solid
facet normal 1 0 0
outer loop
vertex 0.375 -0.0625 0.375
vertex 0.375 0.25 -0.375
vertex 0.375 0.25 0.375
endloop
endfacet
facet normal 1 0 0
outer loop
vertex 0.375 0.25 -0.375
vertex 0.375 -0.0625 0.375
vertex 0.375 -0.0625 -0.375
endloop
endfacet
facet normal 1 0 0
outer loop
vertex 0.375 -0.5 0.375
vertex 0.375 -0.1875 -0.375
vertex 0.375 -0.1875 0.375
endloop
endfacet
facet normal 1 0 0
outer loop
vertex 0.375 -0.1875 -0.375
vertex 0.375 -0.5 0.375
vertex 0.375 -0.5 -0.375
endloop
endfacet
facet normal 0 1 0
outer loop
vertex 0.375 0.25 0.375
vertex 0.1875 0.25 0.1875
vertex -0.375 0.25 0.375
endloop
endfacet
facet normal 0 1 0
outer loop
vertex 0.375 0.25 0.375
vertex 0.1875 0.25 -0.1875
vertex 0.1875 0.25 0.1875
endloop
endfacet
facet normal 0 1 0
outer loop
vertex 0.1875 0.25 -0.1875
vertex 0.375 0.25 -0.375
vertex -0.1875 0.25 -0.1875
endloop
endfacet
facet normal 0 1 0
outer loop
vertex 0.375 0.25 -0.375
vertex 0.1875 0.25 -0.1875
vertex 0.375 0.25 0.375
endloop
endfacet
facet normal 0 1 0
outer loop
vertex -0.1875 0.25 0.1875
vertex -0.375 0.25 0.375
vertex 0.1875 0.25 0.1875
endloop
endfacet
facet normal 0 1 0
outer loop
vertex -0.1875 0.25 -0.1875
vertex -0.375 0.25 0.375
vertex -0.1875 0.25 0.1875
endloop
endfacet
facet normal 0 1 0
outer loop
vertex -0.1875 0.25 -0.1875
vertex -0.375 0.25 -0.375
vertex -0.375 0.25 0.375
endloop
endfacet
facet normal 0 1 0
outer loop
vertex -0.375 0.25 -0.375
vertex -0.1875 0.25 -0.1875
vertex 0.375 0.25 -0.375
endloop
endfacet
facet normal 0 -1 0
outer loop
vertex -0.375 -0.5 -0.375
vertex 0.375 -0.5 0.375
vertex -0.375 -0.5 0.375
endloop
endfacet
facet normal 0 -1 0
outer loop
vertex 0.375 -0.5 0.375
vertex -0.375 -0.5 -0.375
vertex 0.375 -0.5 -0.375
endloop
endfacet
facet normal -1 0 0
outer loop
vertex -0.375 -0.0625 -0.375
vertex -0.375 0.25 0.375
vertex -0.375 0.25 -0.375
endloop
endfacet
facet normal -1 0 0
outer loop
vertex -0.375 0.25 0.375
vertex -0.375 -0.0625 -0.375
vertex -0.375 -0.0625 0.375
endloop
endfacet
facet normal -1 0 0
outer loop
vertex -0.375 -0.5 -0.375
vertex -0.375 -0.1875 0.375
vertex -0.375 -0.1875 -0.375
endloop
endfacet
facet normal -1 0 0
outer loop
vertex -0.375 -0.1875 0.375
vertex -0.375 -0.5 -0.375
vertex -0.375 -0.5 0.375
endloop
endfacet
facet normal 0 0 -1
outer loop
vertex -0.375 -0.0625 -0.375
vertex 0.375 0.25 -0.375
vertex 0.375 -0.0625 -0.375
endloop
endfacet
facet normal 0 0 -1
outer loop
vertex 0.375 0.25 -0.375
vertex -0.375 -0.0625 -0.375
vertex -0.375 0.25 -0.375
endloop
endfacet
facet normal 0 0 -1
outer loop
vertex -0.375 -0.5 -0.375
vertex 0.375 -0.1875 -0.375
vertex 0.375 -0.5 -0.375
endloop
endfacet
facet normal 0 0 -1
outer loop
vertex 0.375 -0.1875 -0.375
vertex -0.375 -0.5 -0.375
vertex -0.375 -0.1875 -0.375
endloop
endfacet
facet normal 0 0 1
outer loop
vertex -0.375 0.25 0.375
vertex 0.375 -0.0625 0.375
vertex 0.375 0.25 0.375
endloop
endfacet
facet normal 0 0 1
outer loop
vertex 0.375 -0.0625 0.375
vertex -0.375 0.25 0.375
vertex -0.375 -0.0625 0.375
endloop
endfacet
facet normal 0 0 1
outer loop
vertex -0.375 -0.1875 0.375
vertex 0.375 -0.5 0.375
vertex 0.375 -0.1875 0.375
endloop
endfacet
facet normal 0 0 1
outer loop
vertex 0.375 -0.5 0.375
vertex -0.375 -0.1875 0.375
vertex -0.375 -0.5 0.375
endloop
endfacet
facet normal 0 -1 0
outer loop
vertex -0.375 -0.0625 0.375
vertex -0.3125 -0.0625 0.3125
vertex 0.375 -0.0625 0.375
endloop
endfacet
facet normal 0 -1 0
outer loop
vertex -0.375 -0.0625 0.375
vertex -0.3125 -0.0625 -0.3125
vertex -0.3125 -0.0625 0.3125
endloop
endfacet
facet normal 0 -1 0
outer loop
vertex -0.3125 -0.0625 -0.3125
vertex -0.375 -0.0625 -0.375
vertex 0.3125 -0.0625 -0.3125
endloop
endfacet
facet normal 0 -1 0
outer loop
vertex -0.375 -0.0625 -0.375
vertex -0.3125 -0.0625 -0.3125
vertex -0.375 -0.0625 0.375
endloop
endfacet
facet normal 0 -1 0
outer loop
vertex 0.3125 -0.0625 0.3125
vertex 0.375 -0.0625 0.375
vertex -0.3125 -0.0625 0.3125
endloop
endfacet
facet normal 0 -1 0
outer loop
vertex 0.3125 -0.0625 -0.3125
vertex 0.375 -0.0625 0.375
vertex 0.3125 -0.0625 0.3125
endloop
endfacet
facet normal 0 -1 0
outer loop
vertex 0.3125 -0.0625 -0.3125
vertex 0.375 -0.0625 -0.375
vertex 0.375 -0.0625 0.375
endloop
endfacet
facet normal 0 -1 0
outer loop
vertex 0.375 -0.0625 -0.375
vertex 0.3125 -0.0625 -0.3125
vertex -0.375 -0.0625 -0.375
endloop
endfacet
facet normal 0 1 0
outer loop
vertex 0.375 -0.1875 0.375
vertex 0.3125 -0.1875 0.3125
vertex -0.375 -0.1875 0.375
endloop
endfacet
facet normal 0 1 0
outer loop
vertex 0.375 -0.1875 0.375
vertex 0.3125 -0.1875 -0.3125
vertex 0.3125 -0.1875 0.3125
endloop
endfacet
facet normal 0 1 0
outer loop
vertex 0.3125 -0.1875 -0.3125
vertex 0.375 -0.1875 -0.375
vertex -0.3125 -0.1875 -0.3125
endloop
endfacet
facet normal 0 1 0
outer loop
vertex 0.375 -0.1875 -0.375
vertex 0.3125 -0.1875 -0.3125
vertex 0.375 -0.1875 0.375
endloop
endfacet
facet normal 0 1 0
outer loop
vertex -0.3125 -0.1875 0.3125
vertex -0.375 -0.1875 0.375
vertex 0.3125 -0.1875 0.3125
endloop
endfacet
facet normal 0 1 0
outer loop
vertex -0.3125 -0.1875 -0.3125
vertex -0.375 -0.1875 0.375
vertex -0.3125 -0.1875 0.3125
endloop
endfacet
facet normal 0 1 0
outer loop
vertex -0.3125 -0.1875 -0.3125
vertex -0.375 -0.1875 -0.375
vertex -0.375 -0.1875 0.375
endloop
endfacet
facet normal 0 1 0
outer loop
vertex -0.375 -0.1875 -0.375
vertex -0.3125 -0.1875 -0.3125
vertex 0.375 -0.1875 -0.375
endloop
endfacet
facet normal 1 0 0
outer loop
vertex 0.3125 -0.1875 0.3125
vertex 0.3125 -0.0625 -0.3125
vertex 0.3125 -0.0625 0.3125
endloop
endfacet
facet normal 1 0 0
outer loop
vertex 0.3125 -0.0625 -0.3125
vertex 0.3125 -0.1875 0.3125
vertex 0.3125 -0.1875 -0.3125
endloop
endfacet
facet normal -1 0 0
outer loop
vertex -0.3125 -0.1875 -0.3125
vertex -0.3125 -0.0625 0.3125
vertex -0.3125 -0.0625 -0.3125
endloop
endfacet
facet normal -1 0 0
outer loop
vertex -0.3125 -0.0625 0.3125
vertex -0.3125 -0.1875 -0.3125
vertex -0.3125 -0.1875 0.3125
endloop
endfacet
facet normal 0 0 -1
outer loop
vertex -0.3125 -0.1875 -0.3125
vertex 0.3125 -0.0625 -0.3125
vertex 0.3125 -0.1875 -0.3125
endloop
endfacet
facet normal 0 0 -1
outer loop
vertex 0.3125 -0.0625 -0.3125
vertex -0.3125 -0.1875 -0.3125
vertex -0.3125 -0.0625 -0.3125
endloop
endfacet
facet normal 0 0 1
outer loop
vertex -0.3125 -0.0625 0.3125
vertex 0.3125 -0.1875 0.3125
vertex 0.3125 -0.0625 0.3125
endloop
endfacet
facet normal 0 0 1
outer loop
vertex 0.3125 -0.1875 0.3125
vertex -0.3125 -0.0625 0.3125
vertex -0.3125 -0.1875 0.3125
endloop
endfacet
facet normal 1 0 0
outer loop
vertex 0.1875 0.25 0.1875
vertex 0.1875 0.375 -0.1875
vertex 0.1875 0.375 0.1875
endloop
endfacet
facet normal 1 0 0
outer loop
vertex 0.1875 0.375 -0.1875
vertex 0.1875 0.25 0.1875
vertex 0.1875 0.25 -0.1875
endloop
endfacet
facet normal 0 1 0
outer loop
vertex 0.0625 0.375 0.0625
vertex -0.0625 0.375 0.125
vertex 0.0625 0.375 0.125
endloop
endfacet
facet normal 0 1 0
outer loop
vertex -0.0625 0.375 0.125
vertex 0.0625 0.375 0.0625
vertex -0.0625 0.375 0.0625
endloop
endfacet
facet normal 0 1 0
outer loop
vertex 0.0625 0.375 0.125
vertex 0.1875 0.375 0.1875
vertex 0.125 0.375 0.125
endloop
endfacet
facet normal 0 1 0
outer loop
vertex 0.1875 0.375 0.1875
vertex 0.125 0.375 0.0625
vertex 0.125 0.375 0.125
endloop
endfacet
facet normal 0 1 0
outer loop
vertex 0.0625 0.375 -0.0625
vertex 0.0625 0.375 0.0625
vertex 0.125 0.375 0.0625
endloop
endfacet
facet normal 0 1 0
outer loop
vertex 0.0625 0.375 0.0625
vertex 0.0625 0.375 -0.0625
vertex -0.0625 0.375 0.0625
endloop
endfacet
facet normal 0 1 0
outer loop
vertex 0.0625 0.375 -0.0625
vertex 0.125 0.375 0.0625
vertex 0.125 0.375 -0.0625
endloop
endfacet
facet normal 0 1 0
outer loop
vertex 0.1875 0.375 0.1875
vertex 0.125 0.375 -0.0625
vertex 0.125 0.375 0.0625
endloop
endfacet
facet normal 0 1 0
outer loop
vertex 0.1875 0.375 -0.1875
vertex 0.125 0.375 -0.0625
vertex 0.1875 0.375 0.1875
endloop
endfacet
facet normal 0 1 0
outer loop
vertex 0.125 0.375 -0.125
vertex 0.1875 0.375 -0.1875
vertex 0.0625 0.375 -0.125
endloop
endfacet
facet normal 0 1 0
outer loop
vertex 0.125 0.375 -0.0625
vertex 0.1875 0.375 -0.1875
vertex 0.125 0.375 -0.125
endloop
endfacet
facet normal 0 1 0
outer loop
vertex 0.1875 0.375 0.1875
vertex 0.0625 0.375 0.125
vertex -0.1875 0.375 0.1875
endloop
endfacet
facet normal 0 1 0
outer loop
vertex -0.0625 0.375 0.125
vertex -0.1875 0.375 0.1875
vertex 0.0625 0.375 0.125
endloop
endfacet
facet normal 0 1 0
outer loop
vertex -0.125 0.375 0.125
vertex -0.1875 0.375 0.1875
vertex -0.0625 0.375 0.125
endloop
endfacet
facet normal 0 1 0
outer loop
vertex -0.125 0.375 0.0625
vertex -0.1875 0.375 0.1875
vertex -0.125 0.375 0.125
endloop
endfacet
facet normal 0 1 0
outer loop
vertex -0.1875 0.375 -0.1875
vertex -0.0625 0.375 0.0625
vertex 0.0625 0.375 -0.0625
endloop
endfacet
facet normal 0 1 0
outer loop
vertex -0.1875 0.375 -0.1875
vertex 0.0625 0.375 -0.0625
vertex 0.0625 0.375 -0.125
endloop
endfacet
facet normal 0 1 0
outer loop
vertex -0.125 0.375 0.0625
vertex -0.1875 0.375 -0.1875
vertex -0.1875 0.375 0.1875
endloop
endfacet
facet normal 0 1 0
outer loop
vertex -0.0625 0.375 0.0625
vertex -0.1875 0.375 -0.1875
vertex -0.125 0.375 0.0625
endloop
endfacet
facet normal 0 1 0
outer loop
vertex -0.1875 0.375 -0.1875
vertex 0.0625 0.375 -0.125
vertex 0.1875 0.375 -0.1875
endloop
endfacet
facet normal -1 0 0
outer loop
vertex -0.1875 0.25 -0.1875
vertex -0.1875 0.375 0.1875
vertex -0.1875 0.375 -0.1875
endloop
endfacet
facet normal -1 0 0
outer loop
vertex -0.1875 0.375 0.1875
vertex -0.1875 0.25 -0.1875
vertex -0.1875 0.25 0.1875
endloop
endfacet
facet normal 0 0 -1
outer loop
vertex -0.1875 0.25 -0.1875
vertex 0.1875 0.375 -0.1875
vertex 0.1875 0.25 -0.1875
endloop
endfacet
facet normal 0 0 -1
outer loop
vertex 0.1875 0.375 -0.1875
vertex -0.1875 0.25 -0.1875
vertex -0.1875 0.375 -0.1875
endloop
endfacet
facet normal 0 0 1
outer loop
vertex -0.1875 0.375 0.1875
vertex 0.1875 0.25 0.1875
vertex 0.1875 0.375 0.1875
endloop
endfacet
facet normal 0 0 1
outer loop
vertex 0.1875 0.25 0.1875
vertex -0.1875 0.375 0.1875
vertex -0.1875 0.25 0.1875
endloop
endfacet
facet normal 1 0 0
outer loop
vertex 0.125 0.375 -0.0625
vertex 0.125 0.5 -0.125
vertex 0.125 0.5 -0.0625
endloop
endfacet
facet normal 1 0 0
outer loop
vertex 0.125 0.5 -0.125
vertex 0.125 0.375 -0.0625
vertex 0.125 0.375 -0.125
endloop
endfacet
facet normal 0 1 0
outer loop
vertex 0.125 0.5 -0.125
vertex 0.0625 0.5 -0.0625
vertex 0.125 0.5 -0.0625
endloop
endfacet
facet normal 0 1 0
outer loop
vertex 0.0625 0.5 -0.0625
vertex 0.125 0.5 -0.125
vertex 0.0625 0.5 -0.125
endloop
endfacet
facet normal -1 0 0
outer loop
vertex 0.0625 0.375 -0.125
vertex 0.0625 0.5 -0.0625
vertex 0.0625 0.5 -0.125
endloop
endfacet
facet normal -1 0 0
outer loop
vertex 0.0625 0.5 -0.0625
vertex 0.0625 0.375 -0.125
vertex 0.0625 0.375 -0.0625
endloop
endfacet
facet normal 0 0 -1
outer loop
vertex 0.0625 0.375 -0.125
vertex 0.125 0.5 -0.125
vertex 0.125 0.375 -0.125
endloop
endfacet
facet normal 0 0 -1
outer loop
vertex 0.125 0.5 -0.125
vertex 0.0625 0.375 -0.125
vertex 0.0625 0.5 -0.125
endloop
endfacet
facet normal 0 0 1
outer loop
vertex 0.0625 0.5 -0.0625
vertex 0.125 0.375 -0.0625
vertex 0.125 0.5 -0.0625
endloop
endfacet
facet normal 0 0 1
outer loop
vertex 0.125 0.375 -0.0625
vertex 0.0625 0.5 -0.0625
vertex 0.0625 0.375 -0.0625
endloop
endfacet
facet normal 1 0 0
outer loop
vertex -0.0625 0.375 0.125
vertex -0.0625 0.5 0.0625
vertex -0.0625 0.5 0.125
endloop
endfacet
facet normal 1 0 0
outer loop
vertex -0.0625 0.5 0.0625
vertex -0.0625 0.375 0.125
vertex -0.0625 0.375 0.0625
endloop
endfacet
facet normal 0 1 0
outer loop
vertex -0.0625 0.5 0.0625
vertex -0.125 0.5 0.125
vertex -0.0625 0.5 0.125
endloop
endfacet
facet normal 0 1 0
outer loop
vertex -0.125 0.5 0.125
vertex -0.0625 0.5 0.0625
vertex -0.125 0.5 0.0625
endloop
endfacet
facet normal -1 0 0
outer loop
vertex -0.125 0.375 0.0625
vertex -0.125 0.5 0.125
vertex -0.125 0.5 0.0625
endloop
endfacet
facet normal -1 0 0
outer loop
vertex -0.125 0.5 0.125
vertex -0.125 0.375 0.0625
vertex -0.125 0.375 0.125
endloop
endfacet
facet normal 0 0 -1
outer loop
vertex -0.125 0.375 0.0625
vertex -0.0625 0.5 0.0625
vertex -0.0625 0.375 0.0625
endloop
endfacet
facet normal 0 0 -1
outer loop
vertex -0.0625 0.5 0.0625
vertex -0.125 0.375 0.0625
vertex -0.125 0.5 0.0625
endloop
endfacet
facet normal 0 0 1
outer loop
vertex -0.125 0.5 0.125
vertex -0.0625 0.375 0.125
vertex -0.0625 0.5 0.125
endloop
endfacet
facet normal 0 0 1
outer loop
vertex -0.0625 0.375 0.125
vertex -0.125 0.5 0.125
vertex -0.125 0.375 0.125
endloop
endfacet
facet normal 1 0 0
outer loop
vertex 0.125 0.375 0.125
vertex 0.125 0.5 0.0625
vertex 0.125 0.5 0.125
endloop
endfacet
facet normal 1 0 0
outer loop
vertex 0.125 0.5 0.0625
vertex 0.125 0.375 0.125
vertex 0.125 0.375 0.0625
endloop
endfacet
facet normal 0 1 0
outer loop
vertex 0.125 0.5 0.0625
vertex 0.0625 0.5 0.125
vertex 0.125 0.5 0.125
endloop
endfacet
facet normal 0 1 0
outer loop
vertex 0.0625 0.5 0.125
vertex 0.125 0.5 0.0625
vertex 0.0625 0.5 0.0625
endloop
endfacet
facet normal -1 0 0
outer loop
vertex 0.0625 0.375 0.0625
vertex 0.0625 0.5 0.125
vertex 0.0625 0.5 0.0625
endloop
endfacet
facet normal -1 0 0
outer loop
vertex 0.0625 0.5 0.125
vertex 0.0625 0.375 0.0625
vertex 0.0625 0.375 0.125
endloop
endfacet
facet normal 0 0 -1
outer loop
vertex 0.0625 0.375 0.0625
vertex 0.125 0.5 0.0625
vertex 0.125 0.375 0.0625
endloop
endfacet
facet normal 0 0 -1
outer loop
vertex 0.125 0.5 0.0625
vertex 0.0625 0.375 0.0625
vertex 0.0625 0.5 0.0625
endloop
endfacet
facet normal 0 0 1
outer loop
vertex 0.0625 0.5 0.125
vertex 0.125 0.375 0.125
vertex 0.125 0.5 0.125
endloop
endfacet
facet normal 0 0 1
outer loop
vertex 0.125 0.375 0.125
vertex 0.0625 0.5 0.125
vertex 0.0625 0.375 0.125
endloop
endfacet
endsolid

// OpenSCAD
rotate(-90, [1, 0, 0]) {
    translate([0, 0, -2/16])
    difference() {
        cube([12/16, 12/16, 12/16], center = true);
        cube([14/16, 14/16, 2/16], center = true);
    }
    cube([10/16, 10/16, 6/16], center = true);

    translate([0, 0, 5/16])
    cube([6/16, 6/16, 2/16], center = true);
    
    translate([1.5/16, 1.5/16, 0])
    cube([1/16, 1/16, 16/16], center = true);
    
    translate([-1.5/16, -1.5/16, 0])
    cube([1/16, 1/16, 16/16], center = true);
    
    translate([1.5/16, -1.5/16, 0])
    cube([1/16, 1/16, 16/16], center = true);
}
